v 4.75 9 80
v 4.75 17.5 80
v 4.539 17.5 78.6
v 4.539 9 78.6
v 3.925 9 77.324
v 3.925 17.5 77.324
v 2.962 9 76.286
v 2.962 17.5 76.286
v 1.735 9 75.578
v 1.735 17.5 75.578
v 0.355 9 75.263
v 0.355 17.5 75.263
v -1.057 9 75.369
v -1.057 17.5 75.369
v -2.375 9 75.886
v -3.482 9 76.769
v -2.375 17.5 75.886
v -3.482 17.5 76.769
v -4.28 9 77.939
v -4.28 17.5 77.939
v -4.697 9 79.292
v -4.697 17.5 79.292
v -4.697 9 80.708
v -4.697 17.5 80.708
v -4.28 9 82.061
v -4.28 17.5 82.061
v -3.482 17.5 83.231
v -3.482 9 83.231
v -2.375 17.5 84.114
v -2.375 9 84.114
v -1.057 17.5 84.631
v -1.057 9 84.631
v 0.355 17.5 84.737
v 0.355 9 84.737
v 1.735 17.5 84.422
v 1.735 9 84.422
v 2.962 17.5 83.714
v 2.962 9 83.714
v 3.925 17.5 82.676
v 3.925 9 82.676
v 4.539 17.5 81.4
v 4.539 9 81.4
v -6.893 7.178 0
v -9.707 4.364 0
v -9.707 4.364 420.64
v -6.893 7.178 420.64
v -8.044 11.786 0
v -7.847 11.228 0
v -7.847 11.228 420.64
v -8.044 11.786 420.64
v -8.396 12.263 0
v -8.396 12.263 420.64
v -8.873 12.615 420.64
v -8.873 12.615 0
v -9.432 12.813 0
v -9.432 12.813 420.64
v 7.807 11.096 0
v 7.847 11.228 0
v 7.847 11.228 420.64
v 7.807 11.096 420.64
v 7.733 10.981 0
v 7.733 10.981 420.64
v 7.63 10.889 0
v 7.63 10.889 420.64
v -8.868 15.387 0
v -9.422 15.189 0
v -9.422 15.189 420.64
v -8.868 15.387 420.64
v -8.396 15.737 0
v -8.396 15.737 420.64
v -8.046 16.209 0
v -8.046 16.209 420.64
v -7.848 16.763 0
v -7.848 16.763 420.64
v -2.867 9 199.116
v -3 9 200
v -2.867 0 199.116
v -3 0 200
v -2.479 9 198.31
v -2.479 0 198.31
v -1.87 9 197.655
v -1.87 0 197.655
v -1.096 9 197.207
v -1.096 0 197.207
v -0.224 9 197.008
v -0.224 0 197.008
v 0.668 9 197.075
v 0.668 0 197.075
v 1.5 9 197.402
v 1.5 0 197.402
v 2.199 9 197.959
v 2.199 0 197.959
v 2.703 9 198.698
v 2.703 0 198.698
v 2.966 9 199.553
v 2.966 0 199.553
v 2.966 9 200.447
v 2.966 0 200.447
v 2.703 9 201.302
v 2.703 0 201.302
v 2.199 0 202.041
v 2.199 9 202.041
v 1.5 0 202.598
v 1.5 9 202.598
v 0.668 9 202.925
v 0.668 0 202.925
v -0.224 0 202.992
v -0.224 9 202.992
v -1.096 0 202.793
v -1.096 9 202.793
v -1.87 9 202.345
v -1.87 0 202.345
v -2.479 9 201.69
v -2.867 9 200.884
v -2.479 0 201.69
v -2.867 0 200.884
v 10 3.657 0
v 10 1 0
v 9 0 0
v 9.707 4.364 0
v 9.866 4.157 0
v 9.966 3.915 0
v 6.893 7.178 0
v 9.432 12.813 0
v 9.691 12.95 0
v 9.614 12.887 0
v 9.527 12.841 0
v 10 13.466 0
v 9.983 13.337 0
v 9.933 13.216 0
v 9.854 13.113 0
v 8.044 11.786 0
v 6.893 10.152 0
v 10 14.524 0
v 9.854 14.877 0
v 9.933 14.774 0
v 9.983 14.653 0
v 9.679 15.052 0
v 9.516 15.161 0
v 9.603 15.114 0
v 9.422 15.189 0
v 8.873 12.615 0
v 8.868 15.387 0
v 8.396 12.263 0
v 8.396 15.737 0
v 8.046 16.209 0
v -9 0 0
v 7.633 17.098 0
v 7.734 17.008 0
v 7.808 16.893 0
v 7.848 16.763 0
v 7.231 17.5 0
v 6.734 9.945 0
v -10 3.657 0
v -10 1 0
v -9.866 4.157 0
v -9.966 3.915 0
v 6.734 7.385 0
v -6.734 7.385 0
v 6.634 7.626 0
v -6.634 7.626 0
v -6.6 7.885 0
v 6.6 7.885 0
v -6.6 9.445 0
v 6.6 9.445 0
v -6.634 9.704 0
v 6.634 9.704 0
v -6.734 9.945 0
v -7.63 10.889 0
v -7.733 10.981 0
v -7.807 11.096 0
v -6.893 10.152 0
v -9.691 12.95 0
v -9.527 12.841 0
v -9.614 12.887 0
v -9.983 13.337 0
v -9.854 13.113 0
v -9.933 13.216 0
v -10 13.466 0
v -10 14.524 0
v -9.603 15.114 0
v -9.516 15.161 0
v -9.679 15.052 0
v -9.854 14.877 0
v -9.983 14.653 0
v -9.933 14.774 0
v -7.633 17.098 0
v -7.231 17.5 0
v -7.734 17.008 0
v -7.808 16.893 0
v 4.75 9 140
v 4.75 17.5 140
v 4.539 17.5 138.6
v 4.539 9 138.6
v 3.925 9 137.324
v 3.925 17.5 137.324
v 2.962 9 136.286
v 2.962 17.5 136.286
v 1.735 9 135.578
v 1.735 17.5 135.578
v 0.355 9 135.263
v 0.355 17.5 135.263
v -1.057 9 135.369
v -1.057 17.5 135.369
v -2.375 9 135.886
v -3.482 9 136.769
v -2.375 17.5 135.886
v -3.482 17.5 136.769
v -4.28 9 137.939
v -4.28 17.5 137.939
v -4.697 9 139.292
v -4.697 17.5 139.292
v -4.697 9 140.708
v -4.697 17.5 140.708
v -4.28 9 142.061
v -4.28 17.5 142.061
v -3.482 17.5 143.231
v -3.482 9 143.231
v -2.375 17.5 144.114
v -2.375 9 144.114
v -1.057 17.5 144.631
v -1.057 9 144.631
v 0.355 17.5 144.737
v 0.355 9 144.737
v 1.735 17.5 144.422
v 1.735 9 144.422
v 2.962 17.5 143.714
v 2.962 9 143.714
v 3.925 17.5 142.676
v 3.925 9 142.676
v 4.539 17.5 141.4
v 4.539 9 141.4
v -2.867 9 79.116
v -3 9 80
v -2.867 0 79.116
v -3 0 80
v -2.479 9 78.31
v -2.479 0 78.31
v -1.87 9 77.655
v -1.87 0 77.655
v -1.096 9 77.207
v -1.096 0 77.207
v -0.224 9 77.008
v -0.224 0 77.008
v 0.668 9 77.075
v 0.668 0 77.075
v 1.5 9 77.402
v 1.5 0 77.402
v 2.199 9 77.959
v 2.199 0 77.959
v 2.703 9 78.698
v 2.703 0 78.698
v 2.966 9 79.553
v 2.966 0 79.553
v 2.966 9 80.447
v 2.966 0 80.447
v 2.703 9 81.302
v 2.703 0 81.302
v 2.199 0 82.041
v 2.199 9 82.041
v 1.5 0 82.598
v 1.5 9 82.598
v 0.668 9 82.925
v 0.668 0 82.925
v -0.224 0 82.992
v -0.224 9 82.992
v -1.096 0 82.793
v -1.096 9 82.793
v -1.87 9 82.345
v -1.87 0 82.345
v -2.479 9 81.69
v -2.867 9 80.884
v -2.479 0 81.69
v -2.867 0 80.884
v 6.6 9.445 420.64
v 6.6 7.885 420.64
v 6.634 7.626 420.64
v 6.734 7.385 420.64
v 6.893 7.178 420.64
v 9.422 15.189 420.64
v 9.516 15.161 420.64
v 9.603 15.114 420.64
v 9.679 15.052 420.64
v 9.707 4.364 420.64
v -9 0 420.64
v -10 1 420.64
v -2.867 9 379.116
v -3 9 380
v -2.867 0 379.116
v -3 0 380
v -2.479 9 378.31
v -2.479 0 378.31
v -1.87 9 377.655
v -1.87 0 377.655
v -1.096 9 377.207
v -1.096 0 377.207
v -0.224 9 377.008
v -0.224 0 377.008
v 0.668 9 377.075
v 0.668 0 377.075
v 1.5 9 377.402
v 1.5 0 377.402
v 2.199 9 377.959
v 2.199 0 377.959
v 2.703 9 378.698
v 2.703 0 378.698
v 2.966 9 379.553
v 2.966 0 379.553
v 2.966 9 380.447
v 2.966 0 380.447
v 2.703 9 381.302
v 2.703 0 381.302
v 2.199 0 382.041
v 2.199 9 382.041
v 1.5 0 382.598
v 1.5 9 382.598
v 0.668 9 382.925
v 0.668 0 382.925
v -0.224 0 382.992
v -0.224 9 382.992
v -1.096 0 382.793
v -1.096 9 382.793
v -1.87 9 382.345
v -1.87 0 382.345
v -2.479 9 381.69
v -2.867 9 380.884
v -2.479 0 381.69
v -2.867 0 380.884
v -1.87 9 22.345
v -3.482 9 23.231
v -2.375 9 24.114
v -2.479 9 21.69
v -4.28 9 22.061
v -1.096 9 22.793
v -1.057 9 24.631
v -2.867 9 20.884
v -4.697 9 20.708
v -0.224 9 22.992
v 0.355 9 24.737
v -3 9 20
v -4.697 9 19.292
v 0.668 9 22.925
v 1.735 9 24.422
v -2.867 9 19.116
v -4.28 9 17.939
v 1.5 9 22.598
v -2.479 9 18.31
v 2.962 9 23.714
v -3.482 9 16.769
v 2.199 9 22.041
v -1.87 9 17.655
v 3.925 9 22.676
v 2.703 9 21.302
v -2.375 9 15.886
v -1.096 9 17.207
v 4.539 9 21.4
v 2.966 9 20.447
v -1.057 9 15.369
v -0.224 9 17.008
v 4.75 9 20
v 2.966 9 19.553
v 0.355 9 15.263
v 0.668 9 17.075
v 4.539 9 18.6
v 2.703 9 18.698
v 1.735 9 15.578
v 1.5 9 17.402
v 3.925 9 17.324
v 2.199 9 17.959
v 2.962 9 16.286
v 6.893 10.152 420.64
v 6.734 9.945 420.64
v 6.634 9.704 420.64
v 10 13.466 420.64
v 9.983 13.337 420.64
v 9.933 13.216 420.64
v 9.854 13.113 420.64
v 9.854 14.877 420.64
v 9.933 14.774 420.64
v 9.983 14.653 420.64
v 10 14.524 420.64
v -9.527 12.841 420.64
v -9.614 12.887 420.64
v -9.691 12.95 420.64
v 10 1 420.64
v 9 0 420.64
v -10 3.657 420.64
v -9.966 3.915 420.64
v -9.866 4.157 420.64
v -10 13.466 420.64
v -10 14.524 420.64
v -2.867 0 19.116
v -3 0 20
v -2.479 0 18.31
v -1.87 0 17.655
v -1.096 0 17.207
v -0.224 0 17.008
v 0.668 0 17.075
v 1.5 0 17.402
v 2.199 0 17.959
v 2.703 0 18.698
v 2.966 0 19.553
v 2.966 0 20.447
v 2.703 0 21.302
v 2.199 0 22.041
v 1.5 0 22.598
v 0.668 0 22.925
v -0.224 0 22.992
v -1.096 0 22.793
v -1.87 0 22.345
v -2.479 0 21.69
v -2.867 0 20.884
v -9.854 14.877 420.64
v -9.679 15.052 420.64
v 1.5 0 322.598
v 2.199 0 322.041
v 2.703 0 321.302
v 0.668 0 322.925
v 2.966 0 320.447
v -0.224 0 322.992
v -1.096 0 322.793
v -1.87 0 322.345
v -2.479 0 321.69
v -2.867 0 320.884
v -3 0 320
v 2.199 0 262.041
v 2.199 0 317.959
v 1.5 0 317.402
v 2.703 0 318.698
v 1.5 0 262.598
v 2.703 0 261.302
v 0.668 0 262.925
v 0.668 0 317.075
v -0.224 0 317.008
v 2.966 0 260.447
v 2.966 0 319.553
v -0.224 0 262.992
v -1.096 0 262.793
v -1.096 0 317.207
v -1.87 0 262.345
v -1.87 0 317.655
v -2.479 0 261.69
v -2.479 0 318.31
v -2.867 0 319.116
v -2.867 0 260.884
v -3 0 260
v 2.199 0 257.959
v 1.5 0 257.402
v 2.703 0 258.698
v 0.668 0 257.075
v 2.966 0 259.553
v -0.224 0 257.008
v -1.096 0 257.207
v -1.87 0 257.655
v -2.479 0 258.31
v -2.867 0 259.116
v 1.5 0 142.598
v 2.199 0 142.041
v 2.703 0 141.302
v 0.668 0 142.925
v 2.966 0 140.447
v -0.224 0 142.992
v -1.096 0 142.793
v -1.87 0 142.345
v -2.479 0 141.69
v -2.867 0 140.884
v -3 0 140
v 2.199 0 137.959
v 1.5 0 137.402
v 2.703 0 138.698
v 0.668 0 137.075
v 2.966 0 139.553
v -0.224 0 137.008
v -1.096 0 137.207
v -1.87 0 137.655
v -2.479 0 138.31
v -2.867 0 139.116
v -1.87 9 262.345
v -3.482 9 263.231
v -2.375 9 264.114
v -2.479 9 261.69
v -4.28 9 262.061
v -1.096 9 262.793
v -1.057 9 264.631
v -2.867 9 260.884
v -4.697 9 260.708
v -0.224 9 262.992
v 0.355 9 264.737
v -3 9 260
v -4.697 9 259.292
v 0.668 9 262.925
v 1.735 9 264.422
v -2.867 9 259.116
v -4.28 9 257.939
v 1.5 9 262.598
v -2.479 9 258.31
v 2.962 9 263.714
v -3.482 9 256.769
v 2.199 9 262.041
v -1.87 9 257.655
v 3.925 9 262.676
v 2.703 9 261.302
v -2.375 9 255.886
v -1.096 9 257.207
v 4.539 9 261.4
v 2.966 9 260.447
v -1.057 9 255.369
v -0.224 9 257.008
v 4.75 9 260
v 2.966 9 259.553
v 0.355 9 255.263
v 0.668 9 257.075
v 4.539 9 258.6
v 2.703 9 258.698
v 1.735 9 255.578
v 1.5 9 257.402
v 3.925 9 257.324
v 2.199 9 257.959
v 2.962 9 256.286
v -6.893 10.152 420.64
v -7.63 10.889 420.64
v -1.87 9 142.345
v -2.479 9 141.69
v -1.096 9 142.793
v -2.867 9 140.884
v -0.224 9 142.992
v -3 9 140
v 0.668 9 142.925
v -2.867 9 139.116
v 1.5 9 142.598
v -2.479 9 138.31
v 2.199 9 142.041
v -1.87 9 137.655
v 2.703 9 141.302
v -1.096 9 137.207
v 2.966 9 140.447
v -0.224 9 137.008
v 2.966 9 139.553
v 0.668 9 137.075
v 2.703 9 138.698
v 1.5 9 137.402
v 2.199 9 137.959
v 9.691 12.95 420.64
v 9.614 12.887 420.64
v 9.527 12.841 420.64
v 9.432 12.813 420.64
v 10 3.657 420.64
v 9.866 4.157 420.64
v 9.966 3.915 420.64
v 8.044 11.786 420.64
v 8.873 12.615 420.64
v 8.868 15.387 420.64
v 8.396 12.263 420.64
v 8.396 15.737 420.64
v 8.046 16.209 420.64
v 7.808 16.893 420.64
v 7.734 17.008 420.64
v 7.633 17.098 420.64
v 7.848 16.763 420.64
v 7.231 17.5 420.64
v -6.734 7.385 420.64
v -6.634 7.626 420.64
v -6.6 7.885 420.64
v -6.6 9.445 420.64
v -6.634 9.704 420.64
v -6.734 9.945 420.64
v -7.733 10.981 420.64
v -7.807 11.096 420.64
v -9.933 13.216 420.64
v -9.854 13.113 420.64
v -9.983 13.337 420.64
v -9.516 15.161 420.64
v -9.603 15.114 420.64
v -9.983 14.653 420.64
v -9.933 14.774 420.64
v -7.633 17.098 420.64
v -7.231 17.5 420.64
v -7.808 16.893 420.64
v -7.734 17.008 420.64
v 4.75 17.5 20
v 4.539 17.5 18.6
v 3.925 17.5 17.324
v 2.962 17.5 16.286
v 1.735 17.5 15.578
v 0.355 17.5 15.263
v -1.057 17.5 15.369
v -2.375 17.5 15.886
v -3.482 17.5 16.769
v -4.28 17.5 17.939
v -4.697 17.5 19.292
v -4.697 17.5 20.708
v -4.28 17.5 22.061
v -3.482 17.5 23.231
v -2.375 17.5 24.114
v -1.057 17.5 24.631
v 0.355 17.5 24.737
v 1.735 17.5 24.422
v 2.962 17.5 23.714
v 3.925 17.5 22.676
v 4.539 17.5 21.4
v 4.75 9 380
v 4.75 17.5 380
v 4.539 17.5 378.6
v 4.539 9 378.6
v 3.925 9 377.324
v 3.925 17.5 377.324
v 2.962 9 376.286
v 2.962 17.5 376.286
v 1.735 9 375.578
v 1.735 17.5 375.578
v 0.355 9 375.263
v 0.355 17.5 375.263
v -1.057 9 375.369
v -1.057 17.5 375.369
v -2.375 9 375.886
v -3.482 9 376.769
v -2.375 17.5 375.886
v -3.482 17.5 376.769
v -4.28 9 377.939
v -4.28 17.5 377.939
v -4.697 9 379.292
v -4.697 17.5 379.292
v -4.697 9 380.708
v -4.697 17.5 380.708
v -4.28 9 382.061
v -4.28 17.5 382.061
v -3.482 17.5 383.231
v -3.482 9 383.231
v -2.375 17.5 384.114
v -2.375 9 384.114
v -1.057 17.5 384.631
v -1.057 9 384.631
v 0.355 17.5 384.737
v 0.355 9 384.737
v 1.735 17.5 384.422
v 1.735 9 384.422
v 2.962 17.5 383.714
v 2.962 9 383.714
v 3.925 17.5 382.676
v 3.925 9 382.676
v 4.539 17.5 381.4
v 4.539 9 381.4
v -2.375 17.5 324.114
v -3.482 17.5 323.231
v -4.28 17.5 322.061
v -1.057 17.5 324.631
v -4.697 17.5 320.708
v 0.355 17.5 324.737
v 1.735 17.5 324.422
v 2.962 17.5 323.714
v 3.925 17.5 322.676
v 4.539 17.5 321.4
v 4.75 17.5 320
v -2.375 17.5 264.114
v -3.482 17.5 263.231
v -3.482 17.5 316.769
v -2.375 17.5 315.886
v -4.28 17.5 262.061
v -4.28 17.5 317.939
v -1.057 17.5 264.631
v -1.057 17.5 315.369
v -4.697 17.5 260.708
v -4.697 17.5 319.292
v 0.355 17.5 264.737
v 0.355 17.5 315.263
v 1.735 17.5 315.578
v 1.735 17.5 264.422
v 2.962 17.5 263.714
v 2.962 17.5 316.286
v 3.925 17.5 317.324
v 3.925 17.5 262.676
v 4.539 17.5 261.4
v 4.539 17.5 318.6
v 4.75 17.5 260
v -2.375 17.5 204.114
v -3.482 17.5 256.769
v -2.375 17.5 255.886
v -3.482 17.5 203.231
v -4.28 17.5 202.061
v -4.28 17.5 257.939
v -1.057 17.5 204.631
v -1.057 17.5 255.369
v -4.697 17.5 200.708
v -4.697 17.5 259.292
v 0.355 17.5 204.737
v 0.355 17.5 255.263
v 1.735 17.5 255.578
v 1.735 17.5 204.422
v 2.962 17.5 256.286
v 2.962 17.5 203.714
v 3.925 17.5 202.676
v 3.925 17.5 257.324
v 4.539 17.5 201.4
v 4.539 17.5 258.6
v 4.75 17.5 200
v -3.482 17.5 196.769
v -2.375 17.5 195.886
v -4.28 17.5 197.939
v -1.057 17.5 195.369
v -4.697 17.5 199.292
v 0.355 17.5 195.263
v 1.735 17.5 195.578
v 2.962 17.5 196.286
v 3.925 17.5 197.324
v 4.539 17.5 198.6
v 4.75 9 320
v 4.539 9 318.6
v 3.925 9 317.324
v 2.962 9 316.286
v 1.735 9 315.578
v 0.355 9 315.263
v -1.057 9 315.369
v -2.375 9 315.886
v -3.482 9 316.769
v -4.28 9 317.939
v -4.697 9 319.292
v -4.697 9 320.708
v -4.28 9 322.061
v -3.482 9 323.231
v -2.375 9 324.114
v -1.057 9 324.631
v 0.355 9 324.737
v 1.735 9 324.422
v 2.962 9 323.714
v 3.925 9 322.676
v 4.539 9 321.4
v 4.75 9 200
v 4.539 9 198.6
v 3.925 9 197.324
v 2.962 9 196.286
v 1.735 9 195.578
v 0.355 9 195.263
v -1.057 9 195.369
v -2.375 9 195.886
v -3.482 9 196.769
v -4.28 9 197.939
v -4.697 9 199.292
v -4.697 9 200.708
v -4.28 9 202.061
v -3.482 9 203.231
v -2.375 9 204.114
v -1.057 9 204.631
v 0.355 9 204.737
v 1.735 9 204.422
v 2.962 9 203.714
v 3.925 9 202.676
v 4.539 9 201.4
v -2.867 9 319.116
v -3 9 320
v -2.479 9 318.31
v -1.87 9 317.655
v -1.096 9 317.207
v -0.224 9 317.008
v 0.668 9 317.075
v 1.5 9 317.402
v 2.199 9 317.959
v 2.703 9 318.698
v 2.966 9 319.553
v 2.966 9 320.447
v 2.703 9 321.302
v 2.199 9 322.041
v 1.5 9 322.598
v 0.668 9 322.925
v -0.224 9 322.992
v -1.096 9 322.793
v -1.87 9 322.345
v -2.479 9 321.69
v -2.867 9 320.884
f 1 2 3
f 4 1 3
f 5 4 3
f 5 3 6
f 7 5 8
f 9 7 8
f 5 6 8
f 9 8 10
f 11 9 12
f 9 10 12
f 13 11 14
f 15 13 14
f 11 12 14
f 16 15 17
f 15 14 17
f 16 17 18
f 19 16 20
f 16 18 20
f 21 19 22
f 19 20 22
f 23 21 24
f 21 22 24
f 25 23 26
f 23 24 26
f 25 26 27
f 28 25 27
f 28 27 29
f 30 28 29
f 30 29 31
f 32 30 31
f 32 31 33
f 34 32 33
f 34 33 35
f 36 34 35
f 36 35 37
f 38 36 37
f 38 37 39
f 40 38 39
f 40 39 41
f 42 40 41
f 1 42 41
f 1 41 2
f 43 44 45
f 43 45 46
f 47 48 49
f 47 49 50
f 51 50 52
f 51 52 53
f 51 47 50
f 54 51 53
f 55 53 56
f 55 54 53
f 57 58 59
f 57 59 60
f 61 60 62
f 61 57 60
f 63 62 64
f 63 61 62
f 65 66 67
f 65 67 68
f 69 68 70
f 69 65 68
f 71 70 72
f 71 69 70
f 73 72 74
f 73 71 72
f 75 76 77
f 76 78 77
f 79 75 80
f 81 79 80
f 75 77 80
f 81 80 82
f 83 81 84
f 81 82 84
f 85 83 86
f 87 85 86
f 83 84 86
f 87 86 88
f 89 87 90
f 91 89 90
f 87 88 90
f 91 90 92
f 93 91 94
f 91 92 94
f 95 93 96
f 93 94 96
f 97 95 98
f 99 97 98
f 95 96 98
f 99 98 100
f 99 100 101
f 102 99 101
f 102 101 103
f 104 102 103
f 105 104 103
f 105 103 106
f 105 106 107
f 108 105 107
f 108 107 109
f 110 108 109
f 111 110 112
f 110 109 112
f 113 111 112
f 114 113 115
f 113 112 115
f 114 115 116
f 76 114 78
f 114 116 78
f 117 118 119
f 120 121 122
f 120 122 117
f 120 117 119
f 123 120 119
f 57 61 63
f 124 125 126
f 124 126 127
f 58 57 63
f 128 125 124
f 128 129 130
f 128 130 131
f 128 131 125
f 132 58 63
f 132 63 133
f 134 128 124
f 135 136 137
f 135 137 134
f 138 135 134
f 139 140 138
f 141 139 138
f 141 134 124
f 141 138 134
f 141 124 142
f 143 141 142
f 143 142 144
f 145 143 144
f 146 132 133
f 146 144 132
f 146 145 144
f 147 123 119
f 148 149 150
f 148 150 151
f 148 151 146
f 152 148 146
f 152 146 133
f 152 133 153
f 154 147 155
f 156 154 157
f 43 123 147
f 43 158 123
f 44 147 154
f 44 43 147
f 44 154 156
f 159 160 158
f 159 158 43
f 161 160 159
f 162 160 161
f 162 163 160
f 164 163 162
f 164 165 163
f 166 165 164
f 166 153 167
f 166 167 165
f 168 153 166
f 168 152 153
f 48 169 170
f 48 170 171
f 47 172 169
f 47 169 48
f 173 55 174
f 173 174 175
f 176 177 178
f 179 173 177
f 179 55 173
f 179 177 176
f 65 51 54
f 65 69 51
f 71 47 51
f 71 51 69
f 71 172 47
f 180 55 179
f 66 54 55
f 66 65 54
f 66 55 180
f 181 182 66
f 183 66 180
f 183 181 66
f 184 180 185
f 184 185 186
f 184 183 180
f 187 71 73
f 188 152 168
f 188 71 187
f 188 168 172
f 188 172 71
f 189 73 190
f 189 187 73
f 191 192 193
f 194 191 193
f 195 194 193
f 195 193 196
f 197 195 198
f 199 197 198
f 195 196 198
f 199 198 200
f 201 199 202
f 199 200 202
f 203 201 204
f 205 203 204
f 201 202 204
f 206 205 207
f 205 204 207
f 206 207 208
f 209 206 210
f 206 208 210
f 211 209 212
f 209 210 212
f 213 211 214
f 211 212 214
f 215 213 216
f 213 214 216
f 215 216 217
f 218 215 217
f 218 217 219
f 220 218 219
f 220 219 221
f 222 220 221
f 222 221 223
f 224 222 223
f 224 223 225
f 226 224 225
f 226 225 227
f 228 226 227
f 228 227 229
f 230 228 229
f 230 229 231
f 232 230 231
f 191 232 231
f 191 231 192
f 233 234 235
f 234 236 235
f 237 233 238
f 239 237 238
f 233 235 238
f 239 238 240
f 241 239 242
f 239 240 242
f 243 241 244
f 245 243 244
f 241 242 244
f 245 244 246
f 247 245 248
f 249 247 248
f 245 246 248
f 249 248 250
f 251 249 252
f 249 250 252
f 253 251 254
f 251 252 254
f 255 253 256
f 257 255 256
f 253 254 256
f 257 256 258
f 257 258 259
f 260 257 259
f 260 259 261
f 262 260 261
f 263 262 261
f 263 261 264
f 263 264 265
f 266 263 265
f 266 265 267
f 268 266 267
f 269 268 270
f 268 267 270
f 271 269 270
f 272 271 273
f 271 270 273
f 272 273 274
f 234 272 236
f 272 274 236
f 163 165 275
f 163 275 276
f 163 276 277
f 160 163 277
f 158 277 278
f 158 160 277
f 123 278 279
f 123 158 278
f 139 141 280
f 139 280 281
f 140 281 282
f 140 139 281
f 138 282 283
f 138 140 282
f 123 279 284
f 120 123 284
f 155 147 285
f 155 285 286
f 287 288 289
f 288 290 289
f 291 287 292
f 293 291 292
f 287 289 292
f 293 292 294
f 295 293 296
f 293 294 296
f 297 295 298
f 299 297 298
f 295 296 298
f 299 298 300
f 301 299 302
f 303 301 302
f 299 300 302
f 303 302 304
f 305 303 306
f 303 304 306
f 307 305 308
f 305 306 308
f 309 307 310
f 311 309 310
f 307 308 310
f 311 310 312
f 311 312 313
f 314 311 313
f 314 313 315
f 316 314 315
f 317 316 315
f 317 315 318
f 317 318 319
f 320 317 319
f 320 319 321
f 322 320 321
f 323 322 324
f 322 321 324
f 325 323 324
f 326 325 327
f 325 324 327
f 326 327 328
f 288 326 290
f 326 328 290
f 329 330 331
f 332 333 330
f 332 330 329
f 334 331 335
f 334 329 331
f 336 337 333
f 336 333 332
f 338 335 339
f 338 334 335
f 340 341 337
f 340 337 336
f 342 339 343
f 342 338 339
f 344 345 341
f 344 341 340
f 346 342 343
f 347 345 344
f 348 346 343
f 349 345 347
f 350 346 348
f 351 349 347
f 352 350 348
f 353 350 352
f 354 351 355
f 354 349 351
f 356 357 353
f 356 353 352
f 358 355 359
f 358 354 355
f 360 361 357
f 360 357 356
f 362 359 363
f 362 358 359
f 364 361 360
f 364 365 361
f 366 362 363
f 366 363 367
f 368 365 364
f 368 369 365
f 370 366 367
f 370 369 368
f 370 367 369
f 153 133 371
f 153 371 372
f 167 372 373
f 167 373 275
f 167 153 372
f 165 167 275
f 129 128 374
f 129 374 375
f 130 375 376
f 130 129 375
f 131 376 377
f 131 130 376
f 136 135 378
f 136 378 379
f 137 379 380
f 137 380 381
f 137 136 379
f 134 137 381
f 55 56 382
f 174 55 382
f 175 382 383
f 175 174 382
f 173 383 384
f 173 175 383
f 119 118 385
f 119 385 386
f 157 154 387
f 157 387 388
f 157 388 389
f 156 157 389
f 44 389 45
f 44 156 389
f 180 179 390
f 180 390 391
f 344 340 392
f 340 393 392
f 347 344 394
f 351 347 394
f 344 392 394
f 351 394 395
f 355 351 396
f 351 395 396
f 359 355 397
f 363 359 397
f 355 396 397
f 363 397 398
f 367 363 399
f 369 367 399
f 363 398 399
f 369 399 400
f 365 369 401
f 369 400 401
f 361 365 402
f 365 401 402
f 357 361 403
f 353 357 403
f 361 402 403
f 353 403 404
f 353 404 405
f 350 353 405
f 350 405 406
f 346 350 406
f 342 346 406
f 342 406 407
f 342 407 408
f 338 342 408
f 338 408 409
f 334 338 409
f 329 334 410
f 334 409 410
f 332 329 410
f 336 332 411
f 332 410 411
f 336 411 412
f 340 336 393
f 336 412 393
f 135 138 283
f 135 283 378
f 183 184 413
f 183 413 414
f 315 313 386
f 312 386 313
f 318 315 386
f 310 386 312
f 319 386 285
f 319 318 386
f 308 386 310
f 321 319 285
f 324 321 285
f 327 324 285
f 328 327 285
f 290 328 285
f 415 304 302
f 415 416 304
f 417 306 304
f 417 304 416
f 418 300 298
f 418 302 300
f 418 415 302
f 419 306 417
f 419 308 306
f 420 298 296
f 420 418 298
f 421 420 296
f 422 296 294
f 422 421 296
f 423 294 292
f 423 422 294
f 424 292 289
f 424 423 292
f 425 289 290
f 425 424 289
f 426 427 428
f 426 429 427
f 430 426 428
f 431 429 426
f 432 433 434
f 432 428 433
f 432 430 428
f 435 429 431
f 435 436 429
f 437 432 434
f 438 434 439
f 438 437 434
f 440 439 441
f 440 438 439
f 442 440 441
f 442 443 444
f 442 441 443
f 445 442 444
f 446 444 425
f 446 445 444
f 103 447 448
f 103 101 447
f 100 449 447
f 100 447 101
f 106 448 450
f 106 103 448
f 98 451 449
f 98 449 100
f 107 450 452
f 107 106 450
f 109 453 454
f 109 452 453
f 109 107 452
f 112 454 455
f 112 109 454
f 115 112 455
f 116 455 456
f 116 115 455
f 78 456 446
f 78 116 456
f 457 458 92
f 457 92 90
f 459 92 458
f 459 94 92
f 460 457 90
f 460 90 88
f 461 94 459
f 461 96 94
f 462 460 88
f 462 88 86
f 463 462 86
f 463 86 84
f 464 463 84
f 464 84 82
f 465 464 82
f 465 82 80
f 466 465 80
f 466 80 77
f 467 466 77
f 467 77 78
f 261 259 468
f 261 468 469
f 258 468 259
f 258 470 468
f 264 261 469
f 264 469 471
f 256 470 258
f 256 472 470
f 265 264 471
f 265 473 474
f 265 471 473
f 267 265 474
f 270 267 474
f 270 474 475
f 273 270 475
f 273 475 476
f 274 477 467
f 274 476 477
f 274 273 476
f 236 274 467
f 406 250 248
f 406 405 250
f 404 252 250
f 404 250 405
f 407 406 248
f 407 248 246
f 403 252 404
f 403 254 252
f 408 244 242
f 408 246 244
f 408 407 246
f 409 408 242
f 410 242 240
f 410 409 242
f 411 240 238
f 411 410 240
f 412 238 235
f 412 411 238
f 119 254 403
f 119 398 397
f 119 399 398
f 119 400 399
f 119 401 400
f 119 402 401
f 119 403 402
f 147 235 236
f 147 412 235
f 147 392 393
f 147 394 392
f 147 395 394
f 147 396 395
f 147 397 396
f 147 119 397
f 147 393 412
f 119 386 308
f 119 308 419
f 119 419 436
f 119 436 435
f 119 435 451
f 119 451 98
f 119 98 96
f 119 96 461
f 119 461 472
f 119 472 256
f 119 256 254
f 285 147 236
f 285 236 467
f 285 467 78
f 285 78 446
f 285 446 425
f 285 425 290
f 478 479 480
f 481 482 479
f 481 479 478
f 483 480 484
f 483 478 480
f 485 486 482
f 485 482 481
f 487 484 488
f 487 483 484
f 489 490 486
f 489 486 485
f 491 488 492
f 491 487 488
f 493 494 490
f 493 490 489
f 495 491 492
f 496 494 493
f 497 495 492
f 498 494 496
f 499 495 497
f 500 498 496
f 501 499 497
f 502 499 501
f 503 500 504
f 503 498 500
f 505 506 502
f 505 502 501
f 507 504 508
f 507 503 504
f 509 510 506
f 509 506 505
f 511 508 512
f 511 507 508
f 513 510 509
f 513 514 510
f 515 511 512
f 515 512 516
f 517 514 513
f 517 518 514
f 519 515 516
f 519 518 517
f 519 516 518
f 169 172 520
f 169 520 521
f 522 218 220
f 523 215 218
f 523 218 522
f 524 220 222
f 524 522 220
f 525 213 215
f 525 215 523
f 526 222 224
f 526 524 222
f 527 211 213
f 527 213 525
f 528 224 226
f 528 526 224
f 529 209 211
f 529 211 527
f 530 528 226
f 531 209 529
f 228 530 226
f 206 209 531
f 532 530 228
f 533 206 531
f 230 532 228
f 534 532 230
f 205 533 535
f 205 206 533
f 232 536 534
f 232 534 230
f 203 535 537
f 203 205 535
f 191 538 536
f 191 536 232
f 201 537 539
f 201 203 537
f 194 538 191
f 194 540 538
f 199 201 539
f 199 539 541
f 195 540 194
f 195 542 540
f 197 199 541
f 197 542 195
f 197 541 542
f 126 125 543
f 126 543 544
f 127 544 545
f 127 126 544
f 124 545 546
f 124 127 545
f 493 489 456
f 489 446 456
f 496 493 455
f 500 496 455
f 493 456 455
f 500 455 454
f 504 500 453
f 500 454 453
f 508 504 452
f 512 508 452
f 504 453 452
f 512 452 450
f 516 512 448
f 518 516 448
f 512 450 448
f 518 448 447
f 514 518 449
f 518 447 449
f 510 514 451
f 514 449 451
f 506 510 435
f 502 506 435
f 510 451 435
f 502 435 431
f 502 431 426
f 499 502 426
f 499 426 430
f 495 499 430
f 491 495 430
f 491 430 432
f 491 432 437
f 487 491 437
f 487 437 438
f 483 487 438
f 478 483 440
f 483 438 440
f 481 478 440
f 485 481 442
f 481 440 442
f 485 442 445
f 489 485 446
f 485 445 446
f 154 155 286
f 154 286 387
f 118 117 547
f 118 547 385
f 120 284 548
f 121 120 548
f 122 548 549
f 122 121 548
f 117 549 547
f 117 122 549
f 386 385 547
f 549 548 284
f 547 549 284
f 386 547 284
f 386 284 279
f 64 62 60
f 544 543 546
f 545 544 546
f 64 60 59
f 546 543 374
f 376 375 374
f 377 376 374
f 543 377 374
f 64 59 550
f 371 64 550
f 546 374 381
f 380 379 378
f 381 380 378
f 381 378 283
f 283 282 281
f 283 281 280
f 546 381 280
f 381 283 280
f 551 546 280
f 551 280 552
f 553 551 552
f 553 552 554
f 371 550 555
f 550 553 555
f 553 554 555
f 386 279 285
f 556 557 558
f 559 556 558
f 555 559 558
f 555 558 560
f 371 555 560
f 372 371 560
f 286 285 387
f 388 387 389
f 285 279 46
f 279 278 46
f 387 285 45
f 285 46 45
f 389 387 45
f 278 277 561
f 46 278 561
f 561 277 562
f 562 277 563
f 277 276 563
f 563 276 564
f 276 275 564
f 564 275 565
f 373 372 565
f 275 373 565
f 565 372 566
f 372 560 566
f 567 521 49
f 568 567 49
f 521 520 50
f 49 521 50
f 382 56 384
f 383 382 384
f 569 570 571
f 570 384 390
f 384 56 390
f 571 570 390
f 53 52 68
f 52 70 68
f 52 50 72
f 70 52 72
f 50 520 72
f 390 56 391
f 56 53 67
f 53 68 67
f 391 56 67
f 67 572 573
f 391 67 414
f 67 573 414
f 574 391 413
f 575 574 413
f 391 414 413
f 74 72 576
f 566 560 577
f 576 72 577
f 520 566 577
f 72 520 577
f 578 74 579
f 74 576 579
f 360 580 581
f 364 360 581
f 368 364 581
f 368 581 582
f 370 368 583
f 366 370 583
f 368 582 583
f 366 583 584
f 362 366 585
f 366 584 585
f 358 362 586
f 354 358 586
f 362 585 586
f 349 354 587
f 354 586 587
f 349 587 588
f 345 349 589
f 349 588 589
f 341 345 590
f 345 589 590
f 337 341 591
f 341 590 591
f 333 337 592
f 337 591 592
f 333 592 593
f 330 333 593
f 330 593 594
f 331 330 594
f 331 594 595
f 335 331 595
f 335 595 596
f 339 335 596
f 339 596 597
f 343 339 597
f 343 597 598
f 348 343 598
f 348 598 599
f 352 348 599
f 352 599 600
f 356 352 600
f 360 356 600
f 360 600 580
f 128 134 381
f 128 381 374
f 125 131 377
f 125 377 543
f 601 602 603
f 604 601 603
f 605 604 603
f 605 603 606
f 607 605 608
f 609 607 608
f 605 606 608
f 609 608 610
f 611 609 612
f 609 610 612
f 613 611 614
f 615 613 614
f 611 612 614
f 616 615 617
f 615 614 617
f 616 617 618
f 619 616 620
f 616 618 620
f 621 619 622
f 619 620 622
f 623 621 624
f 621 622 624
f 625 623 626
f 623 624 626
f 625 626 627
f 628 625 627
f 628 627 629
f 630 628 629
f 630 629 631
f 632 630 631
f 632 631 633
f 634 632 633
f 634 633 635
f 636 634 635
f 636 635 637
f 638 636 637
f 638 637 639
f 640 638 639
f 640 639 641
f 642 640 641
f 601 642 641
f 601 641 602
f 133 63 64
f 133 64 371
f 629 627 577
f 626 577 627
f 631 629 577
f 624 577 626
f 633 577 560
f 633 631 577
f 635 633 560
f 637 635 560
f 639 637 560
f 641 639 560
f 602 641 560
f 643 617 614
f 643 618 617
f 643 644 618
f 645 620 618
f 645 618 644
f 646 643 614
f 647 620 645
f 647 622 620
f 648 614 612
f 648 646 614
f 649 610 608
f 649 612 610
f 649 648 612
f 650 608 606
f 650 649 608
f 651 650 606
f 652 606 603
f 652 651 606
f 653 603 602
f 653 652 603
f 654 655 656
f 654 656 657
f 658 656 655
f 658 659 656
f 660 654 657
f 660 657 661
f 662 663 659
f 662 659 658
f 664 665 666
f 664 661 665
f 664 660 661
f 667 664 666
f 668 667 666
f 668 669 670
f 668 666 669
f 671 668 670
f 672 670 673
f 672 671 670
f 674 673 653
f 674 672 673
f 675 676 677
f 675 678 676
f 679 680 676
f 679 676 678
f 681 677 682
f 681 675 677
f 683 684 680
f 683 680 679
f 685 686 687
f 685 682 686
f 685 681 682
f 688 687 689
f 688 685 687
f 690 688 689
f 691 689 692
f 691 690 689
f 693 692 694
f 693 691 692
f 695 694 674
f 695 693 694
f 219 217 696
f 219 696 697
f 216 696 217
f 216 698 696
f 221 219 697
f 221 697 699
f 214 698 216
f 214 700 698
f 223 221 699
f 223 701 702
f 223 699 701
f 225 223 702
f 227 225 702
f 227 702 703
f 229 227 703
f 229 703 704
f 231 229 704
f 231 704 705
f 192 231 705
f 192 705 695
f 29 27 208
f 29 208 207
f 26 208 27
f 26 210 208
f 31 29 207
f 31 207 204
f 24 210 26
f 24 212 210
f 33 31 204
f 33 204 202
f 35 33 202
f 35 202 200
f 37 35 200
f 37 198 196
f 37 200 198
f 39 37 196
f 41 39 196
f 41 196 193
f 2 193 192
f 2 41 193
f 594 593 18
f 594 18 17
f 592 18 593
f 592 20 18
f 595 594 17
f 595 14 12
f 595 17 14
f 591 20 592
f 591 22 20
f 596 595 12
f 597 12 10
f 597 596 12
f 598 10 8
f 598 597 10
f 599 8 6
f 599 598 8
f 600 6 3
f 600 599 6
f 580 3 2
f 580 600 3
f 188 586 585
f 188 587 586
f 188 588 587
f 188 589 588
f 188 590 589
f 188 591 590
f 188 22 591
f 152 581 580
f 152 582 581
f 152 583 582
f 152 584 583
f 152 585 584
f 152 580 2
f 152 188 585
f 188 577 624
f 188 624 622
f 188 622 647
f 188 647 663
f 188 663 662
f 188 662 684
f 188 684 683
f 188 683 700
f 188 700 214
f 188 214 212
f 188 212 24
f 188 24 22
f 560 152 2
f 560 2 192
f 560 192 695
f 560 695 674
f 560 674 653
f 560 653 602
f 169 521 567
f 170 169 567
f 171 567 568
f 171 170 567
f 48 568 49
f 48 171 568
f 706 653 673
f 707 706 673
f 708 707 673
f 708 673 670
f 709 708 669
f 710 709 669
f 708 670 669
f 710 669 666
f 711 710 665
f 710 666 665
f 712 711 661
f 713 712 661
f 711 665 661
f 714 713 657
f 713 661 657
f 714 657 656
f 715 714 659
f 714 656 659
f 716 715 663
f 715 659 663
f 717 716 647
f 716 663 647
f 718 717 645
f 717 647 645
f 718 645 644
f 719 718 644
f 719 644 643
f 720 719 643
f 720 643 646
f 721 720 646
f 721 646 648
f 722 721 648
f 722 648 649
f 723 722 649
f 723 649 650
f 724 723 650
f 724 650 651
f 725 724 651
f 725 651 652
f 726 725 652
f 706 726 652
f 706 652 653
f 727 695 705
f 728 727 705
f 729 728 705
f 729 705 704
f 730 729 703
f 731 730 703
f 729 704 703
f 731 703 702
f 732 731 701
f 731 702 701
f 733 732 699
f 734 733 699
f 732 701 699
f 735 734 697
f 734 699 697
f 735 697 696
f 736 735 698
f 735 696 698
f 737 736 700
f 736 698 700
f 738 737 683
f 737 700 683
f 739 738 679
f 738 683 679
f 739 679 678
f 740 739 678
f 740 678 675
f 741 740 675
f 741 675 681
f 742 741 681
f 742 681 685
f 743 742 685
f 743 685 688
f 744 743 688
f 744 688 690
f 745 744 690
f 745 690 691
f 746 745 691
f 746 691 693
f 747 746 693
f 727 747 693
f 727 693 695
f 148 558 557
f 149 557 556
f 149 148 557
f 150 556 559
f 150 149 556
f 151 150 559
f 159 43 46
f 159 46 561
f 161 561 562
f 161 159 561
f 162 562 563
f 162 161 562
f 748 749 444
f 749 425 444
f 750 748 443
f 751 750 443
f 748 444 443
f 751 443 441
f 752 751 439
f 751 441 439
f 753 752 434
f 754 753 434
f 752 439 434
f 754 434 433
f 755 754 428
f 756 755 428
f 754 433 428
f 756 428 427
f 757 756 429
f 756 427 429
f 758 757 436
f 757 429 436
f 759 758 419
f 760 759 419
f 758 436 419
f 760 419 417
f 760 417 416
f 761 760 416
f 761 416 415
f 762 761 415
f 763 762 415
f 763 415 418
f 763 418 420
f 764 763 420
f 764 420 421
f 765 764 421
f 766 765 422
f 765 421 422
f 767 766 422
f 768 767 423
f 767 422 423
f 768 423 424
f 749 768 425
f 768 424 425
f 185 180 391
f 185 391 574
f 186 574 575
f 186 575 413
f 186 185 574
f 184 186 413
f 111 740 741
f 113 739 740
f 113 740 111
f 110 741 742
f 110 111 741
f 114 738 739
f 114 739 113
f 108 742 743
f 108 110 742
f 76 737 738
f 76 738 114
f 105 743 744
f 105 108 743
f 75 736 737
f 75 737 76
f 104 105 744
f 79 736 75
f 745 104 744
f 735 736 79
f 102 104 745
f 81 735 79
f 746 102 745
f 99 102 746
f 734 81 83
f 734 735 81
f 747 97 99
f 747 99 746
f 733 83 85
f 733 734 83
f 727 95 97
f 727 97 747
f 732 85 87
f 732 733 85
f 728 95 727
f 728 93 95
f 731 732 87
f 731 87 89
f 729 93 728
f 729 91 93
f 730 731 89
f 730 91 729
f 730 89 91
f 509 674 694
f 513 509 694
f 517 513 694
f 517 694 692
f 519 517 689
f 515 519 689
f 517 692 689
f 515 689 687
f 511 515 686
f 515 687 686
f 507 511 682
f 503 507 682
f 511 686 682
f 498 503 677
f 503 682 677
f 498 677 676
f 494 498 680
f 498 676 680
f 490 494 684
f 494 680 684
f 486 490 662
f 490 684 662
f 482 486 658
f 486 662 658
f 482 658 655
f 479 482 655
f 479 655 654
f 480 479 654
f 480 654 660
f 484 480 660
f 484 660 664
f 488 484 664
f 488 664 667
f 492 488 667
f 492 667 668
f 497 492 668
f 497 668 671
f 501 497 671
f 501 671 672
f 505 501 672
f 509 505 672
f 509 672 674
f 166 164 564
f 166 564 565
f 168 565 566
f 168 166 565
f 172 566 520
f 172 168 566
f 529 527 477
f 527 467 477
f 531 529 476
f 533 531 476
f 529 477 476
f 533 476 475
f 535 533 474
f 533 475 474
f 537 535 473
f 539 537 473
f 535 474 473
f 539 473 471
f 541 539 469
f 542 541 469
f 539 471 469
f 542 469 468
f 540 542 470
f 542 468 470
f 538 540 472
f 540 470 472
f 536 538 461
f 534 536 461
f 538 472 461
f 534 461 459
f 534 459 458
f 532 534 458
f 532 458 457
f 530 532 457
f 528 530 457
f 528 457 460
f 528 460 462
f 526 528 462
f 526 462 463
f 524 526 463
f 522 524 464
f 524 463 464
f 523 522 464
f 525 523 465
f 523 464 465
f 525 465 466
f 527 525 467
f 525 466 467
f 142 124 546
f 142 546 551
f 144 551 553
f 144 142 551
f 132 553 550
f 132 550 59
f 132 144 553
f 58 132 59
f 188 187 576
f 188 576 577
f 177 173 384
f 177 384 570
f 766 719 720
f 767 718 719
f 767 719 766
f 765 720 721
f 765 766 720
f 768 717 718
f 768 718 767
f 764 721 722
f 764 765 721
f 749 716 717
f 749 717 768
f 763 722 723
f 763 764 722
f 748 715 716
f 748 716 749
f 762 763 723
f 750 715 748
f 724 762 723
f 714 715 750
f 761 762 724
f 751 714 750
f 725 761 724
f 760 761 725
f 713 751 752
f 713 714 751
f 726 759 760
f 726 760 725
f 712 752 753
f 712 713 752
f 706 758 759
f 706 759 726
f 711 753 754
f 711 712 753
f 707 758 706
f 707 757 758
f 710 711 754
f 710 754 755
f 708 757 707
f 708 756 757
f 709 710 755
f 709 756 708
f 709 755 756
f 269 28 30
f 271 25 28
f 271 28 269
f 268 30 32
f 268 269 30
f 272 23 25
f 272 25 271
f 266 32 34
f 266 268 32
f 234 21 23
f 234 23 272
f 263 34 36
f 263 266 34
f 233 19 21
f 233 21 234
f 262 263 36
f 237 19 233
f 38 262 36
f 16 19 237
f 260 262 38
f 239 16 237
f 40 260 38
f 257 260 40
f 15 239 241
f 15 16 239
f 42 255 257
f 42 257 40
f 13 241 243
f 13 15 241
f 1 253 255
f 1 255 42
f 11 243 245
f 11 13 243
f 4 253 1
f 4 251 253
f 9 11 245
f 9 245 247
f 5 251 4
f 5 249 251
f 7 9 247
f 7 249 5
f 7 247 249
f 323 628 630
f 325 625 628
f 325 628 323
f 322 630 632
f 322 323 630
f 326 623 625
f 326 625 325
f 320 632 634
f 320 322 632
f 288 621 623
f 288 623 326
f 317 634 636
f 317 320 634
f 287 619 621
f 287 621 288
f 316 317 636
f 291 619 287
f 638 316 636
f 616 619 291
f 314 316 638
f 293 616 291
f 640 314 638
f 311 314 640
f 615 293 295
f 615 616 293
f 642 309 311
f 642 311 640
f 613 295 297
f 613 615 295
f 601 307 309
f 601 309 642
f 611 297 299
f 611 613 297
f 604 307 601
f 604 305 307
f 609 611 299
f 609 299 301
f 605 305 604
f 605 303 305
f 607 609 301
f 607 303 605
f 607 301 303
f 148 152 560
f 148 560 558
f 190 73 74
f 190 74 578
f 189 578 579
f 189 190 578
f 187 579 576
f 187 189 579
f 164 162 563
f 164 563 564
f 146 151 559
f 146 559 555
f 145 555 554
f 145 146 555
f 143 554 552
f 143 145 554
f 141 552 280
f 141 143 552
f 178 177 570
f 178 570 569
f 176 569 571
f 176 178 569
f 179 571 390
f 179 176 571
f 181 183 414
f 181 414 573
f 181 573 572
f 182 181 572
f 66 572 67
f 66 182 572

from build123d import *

# Parameters (mm, degrees)
BOSS_EXTRUDE1_DEPTH                     = 420.64
CBORE_FOR_M5_HEX_HEAD_BOLT1_D           = 6
CBORE_FOR_M5_HEX_HEAD_BOLT1_CBORE_D     = 9.5
CBORE_FOR_M5_HEX_HEAD_BOLT1_CBORE_DEPTH = 8.5


with BuildPart() as part:
    # Model → Boss-Extrude1 (new body)
    with BuildSketch(Plane.XY):
        with BuildLine():
            Line((-9, 0), (-10, 1))
            Line((-10, 1), (-10, 3.656507))
            ThreePointArc((-10, 3.656507), (-9.923879652, 4.039190515), (-9.707107, 4.363614))
            Line((-9.707107, 4.363614), (-6.892893, 7.177827))
            ThreePointArc((-6.892893, 7.177827), (-6.676120348, 7.502250485), (-6.6, 7.884934))
            Line((-6.6, 7.884934), (-6.6, 9.445065))
            ThreePointArc((-6.6, 9.445065), (-6.676120133, 9.827749063), (-6.892893, 10.152173))
            Line((-6.892893, 10.152173), (-7.630162, 10.889441))
            ThreePointArc((-7.630162, 10.889441), (-7.773916111, 11.035785789), (-7.846806076, 11.22753848))
            ThreePointArc((-7.846806076, 11.22753848), (-8.396387934, 12.262927951), (-9.431777507, 12.812509617))
            ThreePointArc((-9.431777507, 12.812509617), (-9.571493724, 12.861817566), (-9.690626, 12.949905))
            Line((-9.690626, 12.949905), (-9.853554, 13.112833))
            ThreePointArc((-9.853554, 13.112833), (-9.961939973, 13.275044564), (-10, 13.466386))
            Line((-10, 13.466386), (-10, 14.523614))
            ThreePointArc((-10, 14.523614), (-9.961940015, 14.714955453), (-9.853554, 14.877167))
            Line((-9.853554, 14.877167), (-9.678501, 15.052219))
            ThreePointArc((-9.678501, 15.052219), (-9.560417777, 15.139748282), (-9.421985167, 15.189159165))
            ThreePointArc((-9.421985167, 15.189159165), (-8.395921393, 15.736919214), (-7.848161791, 16.762983227))
            ThreePointArc((-7.848161791, 16.762983227), (-7.775191189, 16.953001466), (-7.632531, 17.09819))
            Line((-7.632531, 17.09819), (-7.230721, 17.5))
            Line((-7.230721, 17.5), (7.230721, 17.5))
            Line((7.230721, 17.5), (7.632531, 17.09819))
            ThreePointArc((7.632531, 17.09819), (7.775191683, 16.953001656), (7.848162914, 16.762983433))
            ThreePointArc((7.848162914, 16.762983433), (8.395922282, 15.736920132), (9.421985254, 15.189160148))
            ThreePointArc((9.421985254, 15.189160148), (9.560417914, 15.139748806), (9.678501, 15.052219))
            Line((9.678501, 15.052219), (9.853554, 14.877167))
            ThreePointArc((9.853554, 14.877167), (9.961939973, 14.714955436), (10, 14.523614))
            Line((10, 14.523614), (10, 13.466386))
            ThreePointArc((10, 13.466386), (9.961940015, 13.275044547), (9.853554, 13.112833))
            Line((9.853554, 13.112833), (9.690626, 12.949905))
            ThreePointArc((9.690626, 12.949905), (9.571494062, 12.861817368), (9.431778146, 12.812509028))
            ThreePointArc((9.431778146, 12.812509028), (8.39638873, 12.262927298), (7.846806979, 11.227537892))
            ThreePointArc((7.846806979, 11.227537892), (7.77391648, 11.035785414), (7.630162, 10.889441))
            Line((7.630162, 10.889441), (6.892893, 10.152173))
            ThreePointArc((6.892893, 10.152173), (6.676120157, 9.827749053), (6.6, 9.445065))
            Line((6.6, 9.445065), (6.6, 7.884934))
            ThreePointArc((6.6, 7.884934), (6.676120325, 7.502250475), (6.892893, 7.177827))
            Line((6.892893, 7.177827), (9.707107, 4.363614))
            ThreePointArc((9.707107, 4.363614), (9.923879675, 4.039190525), (10, 3.656507))
            Line((10, 3.656507), (10, 1))
            Line((10, 1), (9, 0))
            Line((9, 0), (-9, 0))
        make_face()
    extrude(amount=BOSS_EXTRUDE1_DEPTH)

    # CBORE for M5 Hex Head Bolt1 (through all)
    with Locations(Plane(origin=(0, 17.5, 0), x_dir=(1, 0, 0), z_dir=(0, 1, 0))):
        with Locations((0, -20), (0, -80), (0, -140), (0, -200), (0, -260), (0, -320), (0, -380), (0, -440), (0, -500), (0, -560), (0, -620), (0, -680), (0, -740), (0, -800), (0, -860), (0, -920), (0, -980)):
            CounterBoreHole(CBORE_FOR_M5_HEX_HEAD_BOLT1_D / 2, CBORE_FOR_M5_HEX_HEAD_BOLT1_CBORE_D / 2, CBORE_FOR_M5_HEX_HEAD_BOLT1_CBORE_DEPTH)


solid = part.part
